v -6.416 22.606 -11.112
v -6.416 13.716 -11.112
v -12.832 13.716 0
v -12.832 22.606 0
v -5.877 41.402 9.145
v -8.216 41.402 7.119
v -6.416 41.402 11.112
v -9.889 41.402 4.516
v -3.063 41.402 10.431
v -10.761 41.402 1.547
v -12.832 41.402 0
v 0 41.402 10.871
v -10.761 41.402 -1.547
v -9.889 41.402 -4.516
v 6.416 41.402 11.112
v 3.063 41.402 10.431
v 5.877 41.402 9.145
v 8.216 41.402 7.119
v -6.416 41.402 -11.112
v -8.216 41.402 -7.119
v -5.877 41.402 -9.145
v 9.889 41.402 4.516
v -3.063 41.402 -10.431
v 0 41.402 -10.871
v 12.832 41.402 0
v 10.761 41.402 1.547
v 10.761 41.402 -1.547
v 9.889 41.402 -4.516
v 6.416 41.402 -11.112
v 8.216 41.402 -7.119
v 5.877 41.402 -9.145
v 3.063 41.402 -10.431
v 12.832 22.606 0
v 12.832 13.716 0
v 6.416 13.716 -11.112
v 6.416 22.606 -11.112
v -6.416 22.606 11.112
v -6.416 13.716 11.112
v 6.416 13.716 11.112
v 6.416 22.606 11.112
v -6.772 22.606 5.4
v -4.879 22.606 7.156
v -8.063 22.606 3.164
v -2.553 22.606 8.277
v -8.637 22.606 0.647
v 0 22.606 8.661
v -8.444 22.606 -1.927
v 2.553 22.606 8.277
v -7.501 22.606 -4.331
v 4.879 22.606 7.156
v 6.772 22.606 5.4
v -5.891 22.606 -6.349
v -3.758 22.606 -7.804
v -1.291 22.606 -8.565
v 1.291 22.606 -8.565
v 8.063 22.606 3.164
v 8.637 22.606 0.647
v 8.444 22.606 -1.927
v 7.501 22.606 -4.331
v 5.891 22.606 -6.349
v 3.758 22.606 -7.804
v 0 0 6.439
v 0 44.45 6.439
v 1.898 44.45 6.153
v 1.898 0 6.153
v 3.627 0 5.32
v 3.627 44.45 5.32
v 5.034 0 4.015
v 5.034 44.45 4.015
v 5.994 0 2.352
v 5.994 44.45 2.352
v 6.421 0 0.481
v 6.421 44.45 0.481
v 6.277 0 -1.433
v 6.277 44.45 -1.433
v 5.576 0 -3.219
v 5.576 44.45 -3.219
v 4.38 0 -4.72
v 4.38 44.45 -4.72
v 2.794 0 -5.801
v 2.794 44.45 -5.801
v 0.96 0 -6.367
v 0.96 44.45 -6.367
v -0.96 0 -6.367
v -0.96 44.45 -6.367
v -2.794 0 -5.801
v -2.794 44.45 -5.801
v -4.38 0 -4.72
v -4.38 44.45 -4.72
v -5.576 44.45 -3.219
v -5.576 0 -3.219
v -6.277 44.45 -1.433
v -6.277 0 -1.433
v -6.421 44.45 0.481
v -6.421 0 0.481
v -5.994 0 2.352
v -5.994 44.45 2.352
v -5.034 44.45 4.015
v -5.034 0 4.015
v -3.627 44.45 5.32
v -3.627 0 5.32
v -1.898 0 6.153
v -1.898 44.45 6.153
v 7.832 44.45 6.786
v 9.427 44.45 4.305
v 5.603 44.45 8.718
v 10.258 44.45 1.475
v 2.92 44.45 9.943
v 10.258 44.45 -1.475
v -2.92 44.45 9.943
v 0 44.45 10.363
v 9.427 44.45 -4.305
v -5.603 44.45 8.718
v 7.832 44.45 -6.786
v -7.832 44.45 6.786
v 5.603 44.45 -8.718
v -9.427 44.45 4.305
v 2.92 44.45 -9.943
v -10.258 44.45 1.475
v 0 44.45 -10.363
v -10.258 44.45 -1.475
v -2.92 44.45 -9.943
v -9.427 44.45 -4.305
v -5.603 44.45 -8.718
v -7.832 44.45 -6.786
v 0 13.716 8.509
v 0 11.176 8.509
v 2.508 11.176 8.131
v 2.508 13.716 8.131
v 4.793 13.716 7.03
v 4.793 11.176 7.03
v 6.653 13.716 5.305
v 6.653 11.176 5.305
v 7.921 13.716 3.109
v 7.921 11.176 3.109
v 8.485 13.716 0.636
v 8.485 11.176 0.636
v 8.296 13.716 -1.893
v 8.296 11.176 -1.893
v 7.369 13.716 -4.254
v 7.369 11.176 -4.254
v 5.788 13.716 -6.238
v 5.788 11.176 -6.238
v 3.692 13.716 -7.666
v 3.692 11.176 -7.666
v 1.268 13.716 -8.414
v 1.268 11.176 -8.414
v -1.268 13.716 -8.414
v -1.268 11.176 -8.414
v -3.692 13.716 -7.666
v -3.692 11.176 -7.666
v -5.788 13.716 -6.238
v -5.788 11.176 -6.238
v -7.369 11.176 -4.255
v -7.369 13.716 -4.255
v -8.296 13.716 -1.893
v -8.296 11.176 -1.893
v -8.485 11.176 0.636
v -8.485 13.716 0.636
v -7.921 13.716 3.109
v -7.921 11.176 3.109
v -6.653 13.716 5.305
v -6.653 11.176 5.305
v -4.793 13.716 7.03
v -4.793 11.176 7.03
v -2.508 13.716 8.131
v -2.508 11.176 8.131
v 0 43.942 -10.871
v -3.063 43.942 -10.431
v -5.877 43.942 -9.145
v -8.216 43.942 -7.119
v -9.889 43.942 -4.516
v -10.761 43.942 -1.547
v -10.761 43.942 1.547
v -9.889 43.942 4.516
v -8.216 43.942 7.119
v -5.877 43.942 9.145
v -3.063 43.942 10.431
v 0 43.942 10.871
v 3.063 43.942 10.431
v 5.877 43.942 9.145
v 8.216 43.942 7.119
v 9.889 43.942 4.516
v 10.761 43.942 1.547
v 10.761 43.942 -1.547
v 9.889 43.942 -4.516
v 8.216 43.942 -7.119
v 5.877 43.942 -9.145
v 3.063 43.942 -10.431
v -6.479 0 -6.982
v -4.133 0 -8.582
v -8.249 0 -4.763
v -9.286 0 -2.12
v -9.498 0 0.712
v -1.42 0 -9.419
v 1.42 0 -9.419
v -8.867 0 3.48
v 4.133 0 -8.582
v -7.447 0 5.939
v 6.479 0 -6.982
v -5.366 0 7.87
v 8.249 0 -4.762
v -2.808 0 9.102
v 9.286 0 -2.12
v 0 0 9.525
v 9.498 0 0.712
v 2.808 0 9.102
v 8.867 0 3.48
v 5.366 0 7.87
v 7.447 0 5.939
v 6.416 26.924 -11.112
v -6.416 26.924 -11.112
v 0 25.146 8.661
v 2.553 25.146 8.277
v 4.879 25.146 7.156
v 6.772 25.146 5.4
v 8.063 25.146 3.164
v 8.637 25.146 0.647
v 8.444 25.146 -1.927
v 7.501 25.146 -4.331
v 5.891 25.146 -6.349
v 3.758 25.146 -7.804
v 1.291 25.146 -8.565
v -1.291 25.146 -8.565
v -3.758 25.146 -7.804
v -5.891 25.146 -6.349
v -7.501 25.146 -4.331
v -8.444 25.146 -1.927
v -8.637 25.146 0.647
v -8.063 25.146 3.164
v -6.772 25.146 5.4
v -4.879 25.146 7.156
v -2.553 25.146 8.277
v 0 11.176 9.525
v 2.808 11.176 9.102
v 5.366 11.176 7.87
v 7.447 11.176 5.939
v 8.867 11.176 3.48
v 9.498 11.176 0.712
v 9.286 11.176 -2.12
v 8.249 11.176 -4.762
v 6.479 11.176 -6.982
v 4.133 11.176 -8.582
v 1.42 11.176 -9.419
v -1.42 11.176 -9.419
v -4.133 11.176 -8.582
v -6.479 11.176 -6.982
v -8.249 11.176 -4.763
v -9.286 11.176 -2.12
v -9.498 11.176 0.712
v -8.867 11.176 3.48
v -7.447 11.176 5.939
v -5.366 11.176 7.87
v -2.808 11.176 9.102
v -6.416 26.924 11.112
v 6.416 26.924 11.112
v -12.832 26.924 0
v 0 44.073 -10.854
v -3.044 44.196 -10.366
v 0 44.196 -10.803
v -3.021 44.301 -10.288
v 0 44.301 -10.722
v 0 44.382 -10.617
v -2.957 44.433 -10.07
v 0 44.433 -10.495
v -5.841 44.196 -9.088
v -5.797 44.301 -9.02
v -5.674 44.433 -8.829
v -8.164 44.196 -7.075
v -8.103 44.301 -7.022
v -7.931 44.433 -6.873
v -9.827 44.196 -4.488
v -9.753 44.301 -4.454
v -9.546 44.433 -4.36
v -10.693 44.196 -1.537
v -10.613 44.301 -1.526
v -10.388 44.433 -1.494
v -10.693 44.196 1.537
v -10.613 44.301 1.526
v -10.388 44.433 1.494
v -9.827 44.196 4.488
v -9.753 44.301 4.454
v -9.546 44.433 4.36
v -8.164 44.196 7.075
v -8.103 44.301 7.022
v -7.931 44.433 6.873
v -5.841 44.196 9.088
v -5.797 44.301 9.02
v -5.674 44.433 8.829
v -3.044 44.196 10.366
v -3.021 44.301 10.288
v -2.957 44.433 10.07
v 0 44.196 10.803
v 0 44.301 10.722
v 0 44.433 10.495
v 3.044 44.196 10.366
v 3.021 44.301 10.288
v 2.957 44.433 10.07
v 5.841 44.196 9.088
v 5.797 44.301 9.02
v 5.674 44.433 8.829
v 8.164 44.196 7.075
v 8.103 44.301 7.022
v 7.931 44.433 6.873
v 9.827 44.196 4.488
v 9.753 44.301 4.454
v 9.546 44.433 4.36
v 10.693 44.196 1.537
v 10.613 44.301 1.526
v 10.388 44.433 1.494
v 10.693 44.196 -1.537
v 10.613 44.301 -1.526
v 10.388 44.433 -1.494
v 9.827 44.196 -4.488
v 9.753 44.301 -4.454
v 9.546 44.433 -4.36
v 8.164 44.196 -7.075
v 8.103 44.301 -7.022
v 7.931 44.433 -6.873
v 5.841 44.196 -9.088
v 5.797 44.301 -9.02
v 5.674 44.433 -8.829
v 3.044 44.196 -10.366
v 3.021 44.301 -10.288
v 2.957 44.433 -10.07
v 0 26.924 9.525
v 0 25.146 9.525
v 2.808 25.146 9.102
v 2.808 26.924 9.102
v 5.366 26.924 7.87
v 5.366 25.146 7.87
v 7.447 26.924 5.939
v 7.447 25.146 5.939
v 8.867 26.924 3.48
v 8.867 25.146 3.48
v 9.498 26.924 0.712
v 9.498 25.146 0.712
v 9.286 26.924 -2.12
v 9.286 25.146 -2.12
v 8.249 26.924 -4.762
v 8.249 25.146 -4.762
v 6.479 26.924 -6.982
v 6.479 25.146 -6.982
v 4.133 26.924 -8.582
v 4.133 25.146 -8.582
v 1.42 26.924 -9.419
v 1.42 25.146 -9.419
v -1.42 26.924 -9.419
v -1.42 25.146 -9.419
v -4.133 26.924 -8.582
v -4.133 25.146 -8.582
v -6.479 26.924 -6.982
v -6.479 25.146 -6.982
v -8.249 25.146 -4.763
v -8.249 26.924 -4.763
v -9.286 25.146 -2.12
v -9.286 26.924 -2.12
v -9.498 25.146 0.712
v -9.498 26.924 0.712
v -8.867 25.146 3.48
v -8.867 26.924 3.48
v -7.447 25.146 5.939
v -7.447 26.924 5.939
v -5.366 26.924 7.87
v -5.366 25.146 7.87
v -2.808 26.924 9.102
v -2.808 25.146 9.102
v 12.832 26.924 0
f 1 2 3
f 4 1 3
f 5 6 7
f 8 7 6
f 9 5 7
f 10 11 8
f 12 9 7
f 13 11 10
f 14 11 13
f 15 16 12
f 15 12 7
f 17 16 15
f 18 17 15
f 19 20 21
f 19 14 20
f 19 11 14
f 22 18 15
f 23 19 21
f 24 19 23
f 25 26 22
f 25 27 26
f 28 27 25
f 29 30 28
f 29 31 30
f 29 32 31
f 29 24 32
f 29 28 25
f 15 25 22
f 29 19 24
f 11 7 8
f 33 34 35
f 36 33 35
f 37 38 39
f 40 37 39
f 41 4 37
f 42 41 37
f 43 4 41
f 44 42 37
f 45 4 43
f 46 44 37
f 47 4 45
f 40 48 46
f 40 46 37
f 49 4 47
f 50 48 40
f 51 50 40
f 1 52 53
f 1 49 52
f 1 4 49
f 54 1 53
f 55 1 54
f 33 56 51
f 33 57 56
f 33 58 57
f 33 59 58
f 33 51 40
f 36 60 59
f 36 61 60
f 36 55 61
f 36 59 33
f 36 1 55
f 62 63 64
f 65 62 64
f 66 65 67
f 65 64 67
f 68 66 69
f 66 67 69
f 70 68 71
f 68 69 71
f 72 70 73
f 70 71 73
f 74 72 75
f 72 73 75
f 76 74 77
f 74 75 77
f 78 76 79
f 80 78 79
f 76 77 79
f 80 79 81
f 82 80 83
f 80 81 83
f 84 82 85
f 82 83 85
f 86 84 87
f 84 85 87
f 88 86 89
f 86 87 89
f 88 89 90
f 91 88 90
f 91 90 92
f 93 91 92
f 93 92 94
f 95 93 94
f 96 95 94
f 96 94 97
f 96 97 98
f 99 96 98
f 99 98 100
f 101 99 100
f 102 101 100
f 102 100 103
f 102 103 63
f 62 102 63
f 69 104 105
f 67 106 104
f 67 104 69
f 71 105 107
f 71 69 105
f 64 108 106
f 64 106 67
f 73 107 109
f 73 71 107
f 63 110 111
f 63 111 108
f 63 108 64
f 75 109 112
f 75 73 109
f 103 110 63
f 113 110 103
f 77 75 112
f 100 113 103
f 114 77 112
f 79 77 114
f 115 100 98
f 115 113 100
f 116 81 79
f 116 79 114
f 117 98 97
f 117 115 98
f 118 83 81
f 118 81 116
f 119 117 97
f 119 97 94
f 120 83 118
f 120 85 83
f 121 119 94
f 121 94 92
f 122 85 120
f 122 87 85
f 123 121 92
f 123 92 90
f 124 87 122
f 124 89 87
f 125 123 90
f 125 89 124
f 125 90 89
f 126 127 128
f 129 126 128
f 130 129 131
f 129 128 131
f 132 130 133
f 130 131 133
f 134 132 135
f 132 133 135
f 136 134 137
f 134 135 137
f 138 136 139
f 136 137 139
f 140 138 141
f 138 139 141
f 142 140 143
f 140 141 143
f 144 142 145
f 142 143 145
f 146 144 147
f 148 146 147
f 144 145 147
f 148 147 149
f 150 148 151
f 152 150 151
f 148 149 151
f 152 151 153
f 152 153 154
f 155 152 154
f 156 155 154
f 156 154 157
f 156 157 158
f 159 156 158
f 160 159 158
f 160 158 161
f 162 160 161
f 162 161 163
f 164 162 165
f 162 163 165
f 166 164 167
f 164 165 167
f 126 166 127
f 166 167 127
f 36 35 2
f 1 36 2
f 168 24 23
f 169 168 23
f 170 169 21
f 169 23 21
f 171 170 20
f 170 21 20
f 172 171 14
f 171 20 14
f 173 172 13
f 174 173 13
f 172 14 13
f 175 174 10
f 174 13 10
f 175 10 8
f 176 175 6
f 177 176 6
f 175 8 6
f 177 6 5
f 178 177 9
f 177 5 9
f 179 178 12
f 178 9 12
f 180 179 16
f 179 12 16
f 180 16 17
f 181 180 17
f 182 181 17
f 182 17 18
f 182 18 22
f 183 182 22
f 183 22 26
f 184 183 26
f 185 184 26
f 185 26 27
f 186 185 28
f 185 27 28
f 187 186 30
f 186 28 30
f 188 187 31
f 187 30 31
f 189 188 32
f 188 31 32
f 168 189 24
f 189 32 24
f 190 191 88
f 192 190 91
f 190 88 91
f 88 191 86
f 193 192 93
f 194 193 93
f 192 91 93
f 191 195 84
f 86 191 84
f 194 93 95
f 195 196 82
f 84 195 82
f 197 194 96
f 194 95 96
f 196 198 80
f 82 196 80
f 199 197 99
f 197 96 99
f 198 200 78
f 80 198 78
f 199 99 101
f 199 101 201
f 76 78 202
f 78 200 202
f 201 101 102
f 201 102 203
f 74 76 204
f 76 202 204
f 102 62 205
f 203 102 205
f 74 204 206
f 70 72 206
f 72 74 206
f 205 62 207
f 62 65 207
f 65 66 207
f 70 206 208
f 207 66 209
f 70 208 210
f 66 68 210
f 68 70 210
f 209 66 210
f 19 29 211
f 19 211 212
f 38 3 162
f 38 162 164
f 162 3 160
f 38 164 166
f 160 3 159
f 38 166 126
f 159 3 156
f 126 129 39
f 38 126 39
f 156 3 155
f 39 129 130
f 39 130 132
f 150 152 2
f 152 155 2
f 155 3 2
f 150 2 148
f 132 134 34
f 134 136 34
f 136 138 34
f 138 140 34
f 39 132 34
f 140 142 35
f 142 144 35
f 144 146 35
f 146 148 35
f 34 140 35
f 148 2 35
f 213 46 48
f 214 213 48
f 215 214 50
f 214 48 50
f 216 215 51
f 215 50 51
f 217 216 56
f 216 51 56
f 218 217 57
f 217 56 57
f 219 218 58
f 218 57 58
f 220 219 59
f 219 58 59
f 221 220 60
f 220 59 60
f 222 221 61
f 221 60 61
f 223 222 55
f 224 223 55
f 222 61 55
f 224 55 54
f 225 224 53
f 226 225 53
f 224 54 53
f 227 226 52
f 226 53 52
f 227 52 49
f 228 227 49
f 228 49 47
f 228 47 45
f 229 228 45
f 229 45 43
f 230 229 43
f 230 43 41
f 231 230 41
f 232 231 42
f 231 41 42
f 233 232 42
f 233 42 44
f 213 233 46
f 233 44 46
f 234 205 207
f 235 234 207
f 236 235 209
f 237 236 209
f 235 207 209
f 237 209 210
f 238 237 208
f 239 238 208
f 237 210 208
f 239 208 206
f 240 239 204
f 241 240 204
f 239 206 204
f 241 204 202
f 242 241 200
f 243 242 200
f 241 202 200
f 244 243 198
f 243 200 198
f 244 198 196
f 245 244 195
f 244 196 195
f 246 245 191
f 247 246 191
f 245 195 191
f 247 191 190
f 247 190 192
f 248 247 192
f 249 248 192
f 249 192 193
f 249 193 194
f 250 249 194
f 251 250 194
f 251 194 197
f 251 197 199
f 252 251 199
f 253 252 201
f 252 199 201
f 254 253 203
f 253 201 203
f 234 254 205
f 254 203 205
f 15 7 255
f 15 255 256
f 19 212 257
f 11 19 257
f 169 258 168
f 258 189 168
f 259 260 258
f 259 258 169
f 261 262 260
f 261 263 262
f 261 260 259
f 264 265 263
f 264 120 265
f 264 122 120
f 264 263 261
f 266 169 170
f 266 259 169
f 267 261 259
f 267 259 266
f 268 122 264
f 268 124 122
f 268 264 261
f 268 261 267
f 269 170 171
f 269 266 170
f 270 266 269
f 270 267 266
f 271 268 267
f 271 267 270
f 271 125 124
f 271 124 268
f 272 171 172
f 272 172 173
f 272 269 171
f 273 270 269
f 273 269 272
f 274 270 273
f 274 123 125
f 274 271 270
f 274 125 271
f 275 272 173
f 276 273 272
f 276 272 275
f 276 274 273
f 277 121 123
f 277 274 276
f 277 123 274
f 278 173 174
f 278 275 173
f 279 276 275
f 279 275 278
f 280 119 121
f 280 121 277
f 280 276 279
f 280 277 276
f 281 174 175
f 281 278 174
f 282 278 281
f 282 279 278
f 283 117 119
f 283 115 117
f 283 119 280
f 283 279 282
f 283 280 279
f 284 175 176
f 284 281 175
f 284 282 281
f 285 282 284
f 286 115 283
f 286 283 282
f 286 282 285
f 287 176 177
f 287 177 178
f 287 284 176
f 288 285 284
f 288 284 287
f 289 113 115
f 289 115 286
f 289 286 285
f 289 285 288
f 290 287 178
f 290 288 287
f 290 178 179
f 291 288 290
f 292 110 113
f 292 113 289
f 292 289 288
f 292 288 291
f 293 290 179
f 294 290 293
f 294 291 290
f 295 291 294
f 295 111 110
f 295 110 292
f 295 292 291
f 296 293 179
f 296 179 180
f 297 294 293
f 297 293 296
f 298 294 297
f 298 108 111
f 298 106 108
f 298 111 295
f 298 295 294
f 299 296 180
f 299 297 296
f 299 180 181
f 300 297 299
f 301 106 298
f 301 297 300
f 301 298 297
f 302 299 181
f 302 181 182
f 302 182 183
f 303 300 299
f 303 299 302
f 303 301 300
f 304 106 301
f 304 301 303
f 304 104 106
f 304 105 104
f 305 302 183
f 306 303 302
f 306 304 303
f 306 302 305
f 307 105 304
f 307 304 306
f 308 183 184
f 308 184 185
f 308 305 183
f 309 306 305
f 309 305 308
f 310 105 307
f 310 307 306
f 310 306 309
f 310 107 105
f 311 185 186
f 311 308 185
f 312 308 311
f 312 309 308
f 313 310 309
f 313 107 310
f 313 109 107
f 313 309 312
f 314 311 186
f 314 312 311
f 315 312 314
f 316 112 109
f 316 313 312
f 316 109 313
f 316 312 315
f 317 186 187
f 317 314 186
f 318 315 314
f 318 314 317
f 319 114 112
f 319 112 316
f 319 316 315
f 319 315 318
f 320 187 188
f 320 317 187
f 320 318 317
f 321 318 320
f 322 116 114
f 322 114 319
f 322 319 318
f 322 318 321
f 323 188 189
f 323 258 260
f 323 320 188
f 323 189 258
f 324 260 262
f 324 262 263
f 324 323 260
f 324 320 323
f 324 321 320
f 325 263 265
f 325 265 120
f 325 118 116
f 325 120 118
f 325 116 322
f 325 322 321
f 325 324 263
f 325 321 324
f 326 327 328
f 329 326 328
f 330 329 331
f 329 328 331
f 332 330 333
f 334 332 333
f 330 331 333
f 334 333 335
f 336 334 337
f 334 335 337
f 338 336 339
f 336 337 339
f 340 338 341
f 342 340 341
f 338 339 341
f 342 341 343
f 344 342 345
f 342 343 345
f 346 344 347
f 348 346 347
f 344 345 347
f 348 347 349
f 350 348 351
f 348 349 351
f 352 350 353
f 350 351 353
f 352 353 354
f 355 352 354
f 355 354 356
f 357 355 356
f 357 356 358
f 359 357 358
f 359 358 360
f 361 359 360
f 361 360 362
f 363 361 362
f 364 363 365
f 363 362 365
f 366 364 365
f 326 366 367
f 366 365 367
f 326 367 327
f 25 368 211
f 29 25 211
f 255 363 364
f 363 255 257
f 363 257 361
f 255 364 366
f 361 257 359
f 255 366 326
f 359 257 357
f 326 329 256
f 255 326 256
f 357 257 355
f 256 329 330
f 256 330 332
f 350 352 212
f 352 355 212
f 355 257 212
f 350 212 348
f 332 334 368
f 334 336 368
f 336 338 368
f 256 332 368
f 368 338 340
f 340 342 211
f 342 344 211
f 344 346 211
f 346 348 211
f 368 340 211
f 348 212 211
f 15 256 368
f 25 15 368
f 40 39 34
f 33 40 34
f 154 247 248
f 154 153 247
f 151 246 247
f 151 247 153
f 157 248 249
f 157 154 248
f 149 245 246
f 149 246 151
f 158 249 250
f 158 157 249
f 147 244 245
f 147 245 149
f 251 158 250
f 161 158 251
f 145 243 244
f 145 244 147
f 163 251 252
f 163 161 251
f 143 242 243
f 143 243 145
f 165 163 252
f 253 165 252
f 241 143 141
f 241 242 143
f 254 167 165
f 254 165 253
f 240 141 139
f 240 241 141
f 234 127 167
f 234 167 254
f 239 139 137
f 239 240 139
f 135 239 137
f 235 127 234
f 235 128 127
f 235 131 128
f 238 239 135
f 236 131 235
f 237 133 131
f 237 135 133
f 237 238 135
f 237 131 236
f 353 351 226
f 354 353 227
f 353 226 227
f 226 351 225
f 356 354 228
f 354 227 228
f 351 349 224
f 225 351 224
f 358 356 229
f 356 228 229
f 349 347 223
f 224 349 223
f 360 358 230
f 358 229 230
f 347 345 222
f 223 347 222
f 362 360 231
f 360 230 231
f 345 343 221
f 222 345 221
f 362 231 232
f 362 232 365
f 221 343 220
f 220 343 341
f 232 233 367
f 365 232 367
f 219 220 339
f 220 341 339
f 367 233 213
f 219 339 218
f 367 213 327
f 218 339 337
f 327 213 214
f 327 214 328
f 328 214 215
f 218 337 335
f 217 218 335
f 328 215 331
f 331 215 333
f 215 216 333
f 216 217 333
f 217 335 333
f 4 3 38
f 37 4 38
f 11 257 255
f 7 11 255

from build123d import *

# Parameters (mm, degrees)
SKETCH1_R           = 9.525
BOSS_EXTRUDE1_DEPTH = 11.176
SKETCH3_R           = 8.509
BOSS_EXTRUDE3_DEPTH = 2.54
BOSS_EXTRUDE4_DEPTH = 8.89
SKETCH5_R           = 8.6614
BOSS_EXTRUDE5_DEPTH = 2.54
SKETCH6_R           = 9.525
BOSS_EXTRUDE6_DEPTH = 1.778
BOSS_EXTRUDE7_DEPTH = 14.478
SKETCH8_R           = 10.8712
BOSS_EXTRUDE8_DEPTH = 3.048
FILLET1_R           = 0.508
SKETCH9_R           = 6.4389
CUT_EXTRUDE1_DEPTH  = 48.580882343


with BuildPart() as part:
    # Sketch1 → Boss-Extrude1 (new body)
    with BuildSketch(Plane(origin=(0, 0, 0), x_dir=(1, 0, 0), z_dir=(0, 1, 0))):
        with Locations(Location((0, 0, 0), (0, 0, 270))):
            Circle(SKETCH1_R)
    extrude(amount=BOSS_EXTRUDE1_DEPTH)

    # Sketch3 → Boss-Extrude3 (add)
    with BuildSketch(Plane(origin=(0, 11.176, 0), x_dir=(1, 0, 0), z_dir=(0, 1, 0))):
        with Locations(Location((0, 0, 0), (0, 0, 270))):
            Circle(SKETCH3_R)
    extrude(amount=BOSS_EXTRUDE3_DEPTH)

    # Sketch4 → Boss-Extrude4 (add)
    with BuildSketch(Plane(origin=(0, 13.716, 0), x_dir=(1, 0, 0), z_dir=(0, 1, 0))):
        Polygon((12.831609733, 0), (6.415804866, 11.1125), (-6.415804866, 11.1125), (-12.831609733, 0), (-6.415804866, -11.1125), (6.415804866, -11.1125), align=None)
    extrude(amount=BOSS_EXTRUDE4_DEPTH)

    # Sketch5 → Boss-Extrude5 (add)
    with BuildSketch(Plane(origin=(0, 22.606, 0), x_dir=(1, 0, 0), z_dir=(0, 1, 0))):
        with Locations(Location((0, 0, 0), (0, 0, 270))):
            Circle(SKETCH5_R)
    extrude(amount=BOSS_EXTRUDE5_DEPTH)

    # Sketch6 → Boss-Extrude6 (add)
    with BuildSketch(Plane(origin=(0, 25.146, 0), x_dir=(1, 0, 0), z_dir=(0, 1, 0))):
        with Locations(Location((0, 0, 0), (0, 0, 270))):
            Circle(SKETCH6_R)
    extrude(amount=BOSS_EXTRUDE6_DEPTH)

    # Sketch7 → Boss-Extrude7 (add)
    with BuildSketch(Plane(origin=(0, 26.924, 0), x_dir=(1, 0, 0), z_dir=(0, 1, 0))):
        Polygon((-6.415804866, -11.1125), (6.415804866, -11.1125), (12.831609733, 0), (6.415804866, 11.1125), (-6.415804866, 11.1125), (-12.831609733, 0), align=None)
    extrude(amount=BOSS_EXTRUDE7_DEPTH)

    # Sketch8 → Boss-Extrude8 (add)
    with BuildSketch(Plane(origin=(0, 41.402, 0), x_dir=(1, 0, 0), z_dir=(0, 1, 0))):
        with Locations(Location((0, 0, 0), (0, 0, 90))):
            Circle(SKETCH8_R)
    extrude(amount=BOSS_EXTRUDE8_DEPTH)

    # Fillet1
    fillet1_edges = [part.edges().sort_by_distance(p)[0] for p in [
        (0, 44.45, 10.8712),
    ]]
    fillet(fillet1_edges, radius=FILLET1_R)

    # Sketch9 → Cut-Extrude1 (cut, through all)
    with BuildSketch(Plane(origin=(0, 44.45, 0), x_dir=(1, 0, 0), z_dir=(0, 1, 0))):
        with Locations(Location((0, 0, 0), (0, 0, 270))):
            Circle(SKETCH9_R)
    extrude(amount=-CUT_EXTRUDE1_DEPTH, mode=Mode.SUBTRACT)


solid = part.part
